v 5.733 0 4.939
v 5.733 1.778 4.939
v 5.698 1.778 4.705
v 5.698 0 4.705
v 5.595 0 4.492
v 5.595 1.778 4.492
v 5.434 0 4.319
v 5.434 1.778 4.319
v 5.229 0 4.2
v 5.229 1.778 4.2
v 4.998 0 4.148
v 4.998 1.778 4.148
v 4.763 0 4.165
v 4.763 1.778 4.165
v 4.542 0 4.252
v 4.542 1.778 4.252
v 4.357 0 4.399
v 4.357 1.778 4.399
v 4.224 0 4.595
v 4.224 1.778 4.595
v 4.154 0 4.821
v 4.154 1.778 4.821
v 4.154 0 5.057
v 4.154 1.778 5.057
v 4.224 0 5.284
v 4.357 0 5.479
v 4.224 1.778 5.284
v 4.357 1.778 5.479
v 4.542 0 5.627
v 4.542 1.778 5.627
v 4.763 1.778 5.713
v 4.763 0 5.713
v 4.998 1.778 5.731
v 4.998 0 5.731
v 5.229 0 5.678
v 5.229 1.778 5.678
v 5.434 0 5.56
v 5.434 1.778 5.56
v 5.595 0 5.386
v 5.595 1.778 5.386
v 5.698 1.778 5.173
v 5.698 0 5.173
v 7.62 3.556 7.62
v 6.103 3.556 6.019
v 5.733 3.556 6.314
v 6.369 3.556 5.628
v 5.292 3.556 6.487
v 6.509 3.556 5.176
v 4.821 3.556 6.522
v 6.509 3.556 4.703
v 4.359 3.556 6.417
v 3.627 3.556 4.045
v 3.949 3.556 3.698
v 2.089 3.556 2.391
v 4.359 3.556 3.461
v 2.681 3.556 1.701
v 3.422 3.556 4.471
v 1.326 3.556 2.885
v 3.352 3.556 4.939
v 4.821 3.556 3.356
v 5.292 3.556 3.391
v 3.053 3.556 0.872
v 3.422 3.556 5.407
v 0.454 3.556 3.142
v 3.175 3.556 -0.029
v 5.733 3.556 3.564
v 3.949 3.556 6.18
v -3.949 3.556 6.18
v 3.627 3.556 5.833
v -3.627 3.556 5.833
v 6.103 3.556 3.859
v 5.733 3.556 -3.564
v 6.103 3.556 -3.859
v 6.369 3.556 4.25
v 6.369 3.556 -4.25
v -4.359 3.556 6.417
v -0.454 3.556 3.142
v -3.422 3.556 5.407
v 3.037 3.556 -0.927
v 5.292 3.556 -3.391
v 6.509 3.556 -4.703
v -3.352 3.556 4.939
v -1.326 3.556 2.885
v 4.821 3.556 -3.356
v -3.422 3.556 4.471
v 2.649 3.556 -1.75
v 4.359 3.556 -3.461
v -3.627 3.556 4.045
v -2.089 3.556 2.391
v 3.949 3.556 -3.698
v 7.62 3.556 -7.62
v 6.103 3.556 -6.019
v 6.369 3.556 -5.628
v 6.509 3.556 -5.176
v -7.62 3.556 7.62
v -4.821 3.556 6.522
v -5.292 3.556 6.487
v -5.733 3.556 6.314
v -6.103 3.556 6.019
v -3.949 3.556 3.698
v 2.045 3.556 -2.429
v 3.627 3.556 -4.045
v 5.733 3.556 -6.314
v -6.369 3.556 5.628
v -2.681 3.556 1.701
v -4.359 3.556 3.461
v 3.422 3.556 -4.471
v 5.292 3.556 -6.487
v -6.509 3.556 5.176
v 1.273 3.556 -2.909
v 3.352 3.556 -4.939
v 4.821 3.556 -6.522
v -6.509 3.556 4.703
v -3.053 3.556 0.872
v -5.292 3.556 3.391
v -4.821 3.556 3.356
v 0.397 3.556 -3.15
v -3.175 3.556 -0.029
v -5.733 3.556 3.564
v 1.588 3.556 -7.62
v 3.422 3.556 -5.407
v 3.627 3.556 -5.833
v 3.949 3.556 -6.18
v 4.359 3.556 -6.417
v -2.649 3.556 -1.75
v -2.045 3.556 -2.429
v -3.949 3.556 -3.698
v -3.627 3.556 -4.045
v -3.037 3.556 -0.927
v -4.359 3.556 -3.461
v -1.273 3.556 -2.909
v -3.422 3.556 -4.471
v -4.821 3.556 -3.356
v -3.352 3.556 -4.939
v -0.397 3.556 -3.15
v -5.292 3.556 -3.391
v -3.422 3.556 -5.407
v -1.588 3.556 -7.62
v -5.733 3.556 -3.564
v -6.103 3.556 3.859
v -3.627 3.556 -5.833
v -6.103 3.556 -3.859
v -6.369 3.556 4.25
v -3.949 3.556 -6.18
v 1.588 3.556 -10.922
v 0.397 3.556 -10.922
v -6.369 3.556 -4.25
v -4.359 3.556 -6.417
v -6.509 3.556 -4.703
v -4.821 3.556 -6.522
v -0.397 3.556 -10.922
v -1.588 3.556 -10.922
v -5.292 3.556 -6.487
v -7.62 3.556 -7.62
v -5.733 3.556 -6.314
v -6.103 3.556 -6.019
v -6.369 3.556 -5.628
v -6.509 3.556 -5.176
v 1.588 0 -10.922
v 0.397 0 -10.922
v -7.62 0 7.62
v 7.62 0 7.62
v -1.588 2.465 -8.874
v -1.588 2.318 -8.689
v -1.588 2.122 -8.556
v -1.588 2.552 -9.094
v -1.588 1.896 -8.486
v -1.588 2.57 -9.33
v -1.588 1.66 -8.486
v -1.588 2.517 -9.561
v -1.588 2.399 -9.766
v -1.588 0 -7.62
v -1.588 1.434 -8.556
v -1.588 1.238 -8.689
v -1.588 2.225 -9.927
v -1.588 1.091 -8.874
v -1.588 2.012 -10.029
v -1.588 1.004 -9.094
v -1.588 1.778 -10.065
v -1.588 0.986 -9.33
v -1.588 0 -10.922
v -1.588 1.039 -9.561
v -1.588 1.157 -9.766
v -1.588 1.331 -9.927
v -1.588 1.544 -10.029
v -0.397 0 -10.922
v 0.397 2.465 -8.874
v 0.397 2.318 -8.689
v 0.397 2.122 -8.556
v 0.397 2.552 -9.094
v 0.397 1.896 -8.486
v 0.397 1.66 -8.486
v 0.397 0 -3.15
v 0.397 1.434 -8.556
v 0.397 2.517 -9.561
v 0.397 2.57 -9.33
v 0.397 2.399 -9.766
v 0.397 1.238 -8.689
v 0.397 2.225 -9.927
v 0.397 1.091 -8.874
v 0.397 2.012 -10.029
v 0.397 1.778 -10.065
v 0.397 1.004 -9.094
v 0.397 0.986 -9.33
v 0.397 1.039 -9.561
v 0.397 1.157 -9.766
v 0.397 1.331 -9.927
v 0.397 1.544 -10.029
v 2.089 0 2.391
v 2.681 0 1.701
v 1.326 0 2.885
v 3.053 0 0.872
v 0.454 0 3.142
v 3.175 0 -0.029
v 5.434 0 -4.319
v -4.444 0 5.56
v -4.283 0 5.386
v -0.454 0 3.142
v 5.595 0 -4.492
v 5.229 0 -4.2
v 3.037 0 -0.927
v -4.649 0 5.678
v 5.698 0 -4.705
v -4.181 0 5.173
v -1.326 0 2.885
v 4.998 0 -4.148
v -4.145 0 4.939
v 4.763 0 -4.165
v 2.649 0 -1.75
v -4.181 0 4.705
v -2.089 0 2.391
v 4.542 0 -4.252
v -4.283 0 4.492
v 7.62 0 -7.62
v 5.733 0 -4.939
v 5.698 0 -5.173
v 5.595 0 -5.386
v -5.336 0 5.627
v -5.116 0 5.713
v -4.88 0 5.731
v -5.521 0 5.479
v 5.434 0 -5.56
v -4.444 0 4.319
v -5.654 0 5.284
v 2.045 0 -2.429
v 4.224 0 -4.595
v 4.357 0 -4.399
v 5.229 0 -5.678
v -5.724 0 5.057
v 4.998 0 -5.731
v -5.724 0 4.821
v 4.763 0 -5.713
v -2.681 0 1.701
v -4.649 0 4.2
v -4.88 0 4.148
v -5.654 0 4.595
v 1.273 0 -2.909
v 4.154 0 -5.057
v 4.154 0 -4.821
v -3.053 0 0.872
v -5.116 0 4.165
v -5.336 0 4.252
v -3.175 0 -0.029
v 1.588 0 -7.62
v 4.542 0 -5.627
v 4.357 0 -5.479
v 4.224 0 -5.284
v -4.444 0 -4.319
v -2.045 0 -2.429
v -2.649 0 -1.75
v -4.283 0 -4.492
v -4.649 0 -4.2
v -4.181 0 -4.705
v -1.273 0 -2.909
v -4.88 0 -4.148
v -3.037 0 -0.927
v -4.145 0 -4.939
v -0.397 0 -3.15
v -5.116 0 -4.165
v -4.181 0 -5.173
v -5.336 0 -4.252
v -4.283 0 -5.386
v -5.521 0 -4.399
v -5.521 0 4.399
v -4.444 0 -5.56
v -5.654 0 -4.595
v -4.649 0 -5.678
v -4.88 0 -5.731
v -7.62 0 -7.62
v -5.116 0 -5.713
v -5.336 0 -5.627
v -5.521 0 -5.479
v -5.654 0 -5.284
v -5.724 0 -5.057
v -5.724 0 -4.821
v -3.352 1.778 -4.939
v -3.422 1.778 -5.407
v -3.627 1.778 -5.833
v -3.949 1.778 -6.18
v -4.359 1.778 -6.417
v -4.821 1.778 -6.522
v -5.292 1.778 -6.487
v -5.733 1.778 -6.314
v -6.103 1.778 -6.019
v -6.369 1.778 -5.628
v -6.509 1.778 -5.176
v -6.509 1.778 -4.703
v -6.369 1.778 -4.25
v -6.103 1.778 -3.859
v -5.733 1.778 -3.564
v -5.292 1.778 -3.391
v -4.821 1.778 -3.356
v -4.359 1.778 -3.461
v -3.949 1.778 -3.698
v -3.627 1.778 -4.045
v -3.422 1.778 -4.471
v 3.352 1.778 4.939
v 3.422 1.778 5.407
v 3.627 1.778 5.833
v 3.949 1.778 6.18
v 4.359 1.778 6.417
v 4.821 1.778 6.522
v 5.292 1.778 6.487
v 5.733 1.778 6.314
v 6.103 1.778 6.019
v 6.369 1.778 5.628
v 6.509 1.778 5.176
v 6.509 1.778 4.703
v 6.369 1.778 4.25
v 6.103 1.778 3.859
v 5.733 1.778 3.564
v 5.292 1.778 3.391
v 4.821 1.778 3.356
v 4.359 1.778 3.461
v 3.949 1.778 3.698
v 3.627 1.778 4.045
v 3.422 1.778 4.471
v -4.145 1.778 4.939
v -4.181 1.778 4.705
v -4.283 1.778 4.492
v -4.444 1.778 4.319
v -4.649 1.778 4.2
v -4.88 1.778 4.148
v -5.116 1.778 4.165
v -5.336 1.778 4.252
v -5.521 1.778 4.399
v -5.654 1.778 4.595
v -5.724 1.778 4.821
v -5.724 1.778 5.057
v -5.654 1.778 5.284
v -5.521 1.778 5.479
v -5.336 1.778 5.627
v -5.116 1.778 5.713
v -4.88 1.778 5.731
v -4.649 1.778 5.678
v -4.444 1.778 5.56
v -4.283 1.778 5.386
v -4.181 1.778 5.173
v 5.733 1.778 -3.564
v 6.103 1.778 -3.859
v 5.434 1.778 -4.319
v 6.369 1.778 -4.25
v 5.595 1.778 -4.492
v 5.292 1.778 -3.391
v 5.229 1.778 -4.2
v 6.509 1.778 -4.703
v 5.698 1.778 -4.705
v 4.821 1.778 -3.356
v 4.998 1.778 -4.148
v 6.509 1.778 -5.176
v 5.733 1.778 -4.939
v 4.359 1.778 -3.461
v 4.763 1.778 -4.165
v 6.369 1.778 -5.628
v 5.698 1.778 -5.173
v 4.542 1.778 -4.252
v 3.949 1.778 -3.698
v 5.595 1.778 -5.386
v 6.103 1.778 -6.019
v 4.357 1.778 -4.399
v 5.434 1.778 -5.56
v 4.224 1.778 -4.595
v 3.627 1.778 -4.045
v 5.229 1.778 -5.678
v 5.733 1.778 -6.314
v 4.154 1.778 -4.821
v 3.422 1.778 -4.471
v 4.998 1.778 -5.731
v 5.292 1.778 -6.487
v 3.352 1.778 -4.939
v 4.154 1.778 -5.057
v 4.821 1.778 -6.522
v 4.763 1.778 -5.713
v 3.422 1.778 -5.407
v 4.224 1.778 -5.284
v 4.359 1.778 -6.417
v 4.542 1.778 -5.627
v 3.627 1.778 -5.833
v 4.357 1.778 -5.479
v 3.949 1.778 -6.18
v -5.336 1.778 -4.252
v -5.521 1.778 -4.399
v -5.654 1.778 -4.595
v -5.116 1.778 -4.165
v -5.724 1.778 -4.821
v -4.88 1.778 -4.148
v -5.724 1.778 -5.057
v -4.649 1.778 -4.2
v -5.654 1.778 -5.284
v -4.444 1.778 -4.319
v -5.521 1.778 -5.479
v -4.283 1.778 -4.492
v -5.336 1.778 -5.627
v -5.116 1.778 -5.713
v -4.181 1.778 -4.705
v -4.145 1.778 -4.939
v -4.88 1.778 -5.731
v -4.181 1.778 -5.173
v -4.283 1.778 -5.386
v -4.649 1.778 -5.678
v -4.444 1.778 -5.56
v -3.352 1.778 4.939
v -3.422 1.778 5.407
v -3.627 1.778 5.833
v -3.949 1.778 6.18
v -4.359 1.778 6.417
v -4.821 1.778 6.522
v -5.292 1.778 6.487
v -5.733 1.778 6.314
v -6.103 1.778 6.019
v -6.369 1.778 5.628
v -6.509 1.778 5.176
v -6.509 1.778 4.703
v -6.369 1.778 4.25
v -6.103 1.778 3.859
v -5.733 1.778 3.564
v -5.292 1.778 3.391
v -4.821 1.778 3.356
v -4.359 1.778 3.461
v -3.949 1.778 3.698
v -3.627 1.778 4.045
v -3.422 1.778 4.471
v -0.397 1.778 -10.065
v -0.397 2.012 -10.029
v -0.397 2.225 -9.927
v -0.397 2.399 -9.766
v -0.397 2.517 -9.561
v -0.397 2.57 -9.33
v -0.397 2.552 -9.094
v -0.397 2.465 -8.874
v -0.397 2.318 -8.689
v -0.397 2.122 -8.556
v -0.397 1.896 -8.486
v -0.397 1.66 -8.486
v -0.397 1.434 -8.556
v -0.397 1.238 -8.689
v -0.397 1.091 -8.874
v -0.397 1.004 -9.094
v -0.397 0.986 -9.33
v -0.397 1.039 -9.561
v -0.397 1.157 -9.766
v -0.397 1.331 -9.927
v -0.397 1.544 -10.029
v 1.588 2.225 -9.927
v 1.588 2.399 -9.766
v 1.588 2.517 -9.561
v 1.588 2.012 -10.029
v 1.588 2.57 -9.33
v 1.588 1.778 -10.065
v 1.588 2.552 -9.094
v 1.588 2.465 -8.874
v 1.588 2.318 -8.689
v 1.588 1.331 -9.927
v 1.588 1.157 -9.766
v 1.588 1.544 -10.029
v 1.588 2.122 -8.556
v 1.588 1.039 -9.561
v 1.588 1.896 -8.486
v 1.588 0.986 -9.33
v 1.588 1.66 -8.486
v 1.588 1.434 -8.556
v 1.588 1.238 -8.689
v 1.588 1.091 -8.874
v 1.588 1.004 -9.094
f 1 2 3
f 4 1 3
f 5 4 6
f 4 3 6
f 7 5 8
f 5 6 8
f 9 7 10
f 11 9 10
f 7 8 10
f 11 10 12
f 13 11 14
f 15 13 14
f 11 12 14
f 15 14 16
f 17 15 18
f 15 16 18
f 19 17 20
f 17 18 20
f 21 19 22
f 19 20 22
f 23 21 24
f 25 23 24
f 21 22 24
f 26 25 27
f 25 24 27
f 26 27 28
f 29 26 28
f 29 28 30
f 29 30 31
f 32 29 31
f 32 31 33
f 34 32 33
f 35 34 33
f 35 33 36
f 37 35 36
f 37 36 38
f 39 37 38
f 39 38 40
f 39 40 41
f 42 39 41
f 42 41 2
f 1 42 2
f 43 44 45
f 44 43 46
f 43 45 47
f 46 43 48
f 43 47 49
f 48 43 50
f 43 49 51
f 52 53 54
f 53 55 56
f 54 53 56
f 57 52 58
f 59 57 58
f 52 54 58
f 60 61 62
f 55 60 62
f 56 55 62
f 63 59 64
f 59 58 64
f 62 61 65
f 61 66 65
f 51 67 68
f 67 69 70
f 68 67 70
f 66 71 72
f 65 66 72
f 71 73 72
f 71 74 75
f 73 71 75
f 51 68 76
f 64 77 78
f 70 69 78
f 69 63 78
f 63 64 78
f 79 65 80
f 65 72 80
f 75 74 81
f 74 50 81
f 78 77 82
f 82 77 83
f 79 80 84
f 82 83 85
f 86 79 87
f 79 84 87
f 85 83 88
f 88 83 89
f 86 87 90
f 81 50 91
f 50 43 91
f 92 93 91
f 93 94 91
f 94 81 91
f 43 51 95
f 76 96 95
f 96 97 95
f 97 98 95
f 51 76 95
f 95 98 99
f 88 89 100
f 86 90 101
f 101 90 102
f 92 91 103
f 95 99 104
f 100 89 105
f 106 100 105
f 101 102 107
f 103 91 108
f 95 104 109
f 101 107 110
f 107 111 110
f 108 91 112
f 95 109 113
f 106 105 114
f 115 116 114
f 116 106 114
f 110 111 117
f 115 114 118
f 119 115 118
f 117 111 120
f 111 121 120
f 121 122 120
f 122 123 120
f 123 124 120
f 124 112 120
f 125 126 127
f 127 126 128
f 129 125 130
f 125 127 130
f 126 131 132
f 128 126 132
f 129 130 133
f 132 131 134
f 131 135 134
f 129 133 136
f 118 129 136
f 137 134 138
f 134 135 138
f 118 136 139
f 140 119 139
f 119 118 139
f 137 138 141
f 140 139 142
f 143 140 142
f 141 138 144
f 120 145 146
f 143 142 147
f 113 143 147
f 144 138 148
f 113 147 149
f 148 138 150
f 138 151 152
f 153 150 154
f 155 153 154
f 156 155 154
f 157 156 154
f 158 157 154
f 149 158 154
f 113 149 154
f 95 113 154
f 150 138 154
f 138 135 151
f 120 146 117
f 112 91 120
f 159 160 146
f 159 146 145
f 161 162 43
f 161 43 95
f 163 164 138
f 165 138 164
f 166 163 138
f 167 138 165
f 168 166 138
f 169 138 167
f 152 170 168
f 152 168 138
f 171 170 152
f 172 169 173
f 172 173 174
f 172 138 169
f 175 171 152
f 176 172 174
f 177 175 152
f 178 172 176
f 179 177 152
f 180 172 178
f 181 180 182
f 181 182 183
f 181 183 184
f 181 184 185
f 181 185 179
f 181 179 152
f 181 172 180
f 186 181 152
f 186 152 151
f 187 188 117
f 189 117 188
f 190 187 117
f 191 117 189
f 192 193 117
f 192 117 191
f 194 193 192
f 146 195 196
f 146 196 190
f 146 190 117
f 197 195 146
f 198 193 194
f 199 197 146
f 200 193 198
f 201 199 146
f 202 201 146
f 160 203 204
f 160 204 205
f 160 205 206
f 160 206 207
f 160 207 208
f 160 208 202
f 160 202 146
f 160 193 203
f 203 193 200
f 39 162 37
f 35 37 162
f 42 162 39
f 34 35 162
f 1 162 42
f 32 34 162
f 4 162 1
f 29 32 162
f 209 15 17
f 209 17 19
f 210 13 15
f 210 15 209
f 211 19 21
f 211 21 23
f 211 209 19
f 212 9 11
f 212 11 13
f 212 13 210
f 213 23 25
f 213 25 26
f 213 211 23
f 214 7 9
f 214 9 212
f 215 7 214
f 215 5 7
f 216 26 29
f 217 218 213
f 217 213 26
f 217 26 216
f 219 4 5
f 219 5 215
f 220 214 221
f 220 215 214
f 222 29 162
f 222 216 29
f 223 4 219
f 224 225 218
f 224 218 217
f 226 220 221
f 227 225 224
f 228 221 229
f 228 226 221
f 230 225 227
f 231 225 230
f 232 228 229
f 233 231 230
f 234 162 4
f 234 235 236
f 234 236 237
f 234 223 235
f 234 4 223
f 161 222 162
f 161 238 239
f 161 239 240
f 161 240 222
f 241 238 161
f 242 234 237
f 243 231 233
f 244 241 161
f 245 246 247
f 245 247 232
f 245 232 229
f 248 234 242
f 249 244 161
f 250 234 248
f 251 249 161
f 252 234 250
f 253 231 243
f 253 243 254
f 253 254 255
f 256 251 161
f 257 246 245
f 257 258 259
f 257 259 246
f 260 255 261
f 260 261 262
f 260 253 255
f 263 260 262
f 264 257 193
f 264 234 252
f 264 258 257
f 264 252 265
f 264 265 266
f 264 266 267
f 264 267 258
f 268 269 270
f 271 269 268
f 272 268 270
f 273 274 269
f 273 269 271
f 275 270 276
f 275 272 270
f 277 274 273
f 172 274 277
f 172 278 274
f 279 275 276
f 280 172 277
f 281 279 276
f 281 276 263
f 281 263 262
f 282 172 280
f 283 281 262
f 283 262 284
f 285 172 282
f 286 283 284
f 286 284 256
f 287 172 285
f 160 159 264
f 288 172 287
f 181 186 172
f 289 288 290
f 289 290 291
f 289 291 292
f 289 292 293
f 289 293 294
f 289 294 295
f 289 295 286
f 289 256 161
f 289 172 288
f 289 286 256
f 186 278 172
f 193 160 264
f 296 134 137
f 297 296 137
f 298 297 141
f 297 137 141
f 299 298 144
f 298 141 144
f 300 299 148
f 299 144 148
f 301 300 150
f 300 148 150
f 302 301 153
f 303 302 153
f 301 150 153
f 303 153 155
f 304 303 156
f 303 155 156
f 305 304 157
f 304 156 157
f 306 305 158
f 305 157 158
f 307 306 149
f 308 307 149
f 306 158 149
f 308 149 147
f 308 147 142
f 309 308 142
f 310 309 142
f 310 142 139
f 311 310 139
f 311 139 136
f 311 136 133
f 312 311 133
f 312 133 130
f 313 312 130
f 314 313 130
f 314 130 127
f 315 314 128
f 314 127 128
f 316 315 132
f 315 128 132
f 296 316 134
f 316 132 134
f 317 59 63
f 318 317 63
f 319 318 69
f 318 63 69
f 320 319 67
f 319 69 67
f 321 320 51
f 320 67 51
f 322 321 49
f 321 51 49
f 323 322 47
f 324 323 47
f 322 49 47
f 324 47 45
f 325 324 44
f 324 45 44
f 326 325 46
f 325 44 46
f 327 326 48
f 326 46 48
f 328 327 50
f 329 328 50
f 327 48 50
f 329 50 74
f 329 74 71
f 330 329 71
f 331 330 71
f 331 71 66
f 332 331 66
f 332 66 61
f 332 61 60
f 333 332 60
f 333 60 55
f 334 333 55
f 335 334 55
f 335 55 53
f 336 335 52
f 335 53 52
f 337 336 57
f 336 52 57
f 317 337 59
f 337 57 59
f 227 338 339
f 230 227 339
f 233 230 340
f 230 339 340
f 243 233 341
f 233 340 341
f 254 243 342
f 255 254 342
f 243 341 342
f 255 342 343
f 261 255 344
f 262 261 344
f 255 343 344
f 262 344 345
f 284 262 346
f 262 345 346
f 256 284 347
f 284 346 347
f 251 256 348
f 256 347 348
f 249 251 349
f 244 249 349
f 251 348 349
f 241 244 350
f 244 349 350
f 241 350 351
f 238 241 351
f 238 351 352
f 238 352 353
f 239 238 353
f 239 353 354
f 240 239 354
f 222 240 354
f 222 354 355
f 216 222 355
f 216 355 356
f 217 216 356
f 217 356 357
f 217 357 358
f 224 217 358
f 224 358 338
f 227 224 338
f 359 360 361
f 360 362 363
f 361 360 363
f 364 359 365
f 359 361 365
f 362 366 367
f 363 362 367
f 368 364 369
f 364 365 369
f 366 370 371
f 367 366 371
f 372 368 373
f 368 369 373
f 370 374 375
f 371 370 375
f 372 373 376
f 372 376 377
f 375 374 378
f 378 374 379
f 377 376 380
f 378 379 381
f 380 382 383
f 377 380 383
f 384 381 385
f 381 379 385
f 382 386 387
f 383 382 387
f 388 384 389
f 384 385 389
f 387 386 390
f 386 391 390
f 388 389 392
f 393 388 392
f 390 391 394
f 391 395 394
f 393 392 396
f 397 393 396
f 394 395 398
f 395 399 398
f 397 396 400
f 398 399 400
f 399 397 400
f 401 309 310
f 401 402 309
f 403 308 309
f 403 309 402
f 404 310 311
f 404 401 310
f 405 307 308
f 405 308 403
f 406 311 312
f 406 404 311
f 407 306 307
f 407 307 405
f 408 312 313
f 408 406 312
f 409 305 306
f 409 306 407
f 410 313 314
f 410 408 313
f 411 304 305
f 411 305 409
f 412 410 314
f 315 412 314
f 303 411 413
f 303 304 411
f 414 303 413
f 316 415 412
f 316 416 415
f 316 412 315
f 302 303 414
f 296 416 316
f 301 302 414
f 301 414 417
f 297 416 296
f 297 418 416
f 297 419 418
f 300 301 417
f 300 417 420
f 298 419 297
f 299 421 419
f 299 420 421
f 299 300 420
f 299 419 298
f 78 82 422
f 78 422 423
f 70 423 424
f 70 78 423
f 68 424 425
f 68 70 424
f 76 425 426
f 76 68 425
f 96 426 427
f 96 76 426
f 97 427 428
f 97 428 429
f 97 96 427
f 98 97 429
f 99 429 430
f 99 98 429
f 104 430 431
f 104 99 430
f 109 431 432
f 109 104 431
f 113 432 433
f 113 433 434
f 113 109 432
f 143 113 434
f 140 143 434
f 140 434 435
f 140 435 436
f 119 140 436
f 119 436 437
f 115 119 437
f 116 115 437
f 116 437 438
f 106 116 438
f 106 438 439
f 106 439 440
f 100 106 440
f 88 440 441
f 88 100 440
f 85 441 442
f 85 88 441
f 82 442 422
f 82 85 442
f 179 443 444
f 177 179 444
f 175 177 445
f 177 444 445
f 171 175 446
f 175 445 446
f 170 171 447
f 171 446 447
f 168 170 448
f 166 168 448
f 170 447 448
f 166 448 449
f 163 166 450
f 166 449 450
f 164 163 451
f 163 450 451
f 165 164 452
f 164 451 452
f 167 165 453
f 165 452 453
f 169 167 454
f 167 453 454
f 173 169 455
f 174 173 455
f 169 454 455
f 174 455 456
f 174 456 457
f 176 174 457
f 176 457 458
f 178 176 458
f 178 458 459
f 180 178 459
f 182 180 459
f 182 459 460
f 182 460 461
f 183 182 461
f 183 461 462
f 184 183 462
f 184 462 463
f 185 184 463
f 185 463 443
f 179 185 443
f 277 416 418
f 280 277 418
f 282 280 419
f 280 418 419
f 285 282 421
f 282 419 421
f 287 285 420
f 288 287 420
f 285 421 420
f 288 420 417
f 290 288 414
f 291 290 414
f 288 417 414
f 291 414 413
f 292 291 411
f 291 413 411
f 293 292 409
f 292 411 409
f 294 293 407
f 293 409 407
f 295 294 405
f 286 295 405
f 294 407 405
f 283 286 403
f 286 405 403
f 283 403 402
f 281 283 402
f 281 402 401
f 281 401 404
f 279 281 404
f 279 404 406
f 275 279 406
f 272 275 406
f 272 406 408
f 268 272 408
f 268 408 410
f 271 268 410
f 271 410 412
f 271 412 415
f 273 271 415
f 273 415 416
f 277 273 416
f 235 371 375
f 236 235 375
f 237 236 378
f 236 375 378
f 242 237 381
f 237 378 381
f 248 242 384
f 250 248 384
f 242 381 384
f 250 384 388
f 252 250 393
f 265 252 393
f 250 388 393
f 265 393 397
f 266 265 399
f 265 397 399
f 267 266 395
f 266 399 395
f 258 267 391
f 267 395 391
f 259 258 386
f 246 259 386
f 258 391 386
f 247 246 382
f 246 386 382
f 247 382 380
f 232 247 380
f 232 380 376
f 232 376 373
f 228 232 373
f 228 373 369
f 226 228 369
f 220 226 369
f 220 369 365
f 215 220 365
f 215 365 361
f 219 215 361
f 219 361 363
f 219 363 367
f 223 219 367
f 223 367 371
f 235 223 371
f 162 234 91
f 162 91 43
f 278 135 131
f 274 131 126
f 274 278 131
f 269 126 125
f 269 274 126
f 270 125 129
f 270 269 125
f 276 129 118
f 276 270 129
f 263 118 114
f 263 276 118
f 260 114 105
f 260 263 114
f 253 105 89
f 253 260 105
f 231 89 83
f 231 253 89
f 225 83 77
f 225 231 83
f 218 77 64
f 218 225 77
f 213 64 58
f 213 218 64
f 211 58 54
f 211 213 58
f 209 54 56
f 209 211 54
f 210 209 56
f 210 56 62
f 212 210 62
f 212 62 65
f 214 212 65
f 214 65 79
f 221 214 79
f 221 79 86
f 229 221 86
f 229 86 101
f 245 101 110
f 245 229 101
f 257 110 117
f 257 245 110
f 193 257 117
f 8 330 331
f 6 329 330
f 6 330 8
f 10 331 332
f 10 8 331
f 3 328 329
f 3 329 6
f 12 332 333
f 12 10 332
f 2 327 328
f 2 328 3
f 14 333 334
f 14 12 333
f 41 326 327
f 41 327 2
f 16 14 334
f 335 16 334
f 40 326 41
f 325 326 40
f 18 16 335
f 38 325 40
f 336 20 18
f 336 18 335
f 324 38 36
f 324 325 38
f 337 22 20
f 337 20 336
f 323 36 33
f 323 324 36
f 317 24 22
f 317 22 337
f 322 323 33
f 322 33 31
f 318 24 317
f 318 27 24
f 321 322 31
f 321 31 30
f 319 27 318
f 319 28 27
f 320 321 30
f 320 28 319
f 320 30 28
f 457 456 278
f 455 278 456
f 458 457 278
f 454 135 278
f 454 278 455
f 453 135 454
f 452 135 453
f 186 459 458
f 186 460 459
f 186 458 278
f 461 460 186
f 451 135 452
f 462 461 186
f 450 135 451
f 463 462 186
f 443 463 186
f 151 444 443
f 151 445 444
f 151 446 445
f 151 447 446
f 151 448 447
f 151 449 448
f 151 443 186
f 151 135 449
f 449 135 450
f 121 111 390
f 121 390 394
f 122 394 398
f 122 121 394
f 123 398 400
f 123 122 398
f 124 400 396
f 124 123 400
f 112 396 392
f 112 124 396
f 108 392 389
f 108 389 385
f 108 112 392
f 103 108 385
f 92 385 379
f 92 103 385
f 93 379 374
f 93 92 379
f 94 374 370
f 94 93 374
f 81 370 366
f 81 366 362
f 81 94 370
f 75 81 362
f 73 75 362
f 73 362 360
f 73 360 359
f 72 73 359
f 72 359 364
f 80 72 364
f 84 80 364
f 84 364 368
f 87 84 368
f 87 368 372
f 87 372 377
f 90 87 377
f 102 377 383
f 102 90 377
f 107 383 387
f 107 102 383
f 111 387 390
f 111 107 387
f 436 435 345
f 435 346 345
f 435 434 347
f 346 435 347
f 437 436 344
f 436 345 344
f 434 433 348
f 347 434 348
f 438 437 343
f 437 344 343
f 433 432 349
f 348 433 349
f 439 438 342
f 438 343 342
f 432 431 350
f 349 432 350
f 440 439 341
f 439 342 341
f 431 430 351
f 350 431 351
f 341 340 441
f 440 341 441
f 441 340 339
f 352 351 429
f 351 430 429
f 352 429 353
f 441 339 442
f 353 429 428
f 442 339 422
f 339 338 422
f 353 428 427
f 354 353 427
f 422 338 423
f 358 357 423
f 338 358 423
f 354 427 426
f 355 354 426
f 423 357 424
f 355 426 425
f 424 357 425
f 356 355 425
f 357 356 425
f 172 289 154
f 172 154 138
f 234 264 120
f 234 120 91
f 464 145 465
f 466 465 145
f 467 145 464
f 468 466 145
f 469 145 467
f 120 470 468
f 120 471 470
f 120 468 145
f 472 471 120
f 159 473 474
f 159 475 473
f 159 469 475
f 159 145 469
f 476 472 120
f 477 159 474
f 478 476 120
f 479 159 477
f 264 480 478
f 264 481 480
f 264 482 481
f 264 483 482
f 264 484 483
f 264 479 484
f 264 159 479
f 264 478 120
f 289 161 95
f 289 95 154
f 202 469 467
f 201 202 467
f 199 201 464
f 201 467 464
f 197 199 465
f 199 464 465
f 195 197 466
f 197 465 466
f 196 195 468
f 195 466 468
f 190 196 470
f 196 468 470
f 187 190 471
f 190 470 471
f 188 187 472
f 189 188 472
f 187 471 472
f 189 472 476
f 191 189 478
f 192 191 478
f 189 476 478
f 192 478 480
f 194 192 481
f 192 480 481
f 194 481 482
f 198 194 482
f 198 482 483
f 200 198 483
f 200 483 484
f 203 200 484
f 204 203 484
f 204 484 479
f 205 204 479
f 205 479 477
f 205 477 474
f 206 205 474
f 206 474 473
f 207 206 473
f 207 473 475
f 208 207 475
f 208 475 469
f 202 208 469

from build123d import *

# Parameters (mm, degrees)
SKETCH1_R                                  = 3.175
BOSS_EXTRUDE1_DEPTH                        = 3.556
SKETCH2_R                                  = 0.79375
CUT_EXTRUDE1_DEPTH                         = 4.556
SKETCH3_R                                  = 0.79375
CUT_EXTRUDE2_DEPTH                         = 3.175
SKETCH4_W                                  = 0.79375
SKETCH4_H                                  = 4.469902345
CUT_EXTRUDE3_DEPTH                         = 4.556
SKETCH5_R                                  = 1.5875
CUT_EXTRUDE4_DEPTH                         = 1.778
MIRROR1_AT_THE_SECOND_PLANE_COPY_1_SKETC_R = 1.5875
MIRROR1_AT_THE_SECOND_PLANE_COPY_1_DEPTH   = 1.778


with BuildPart() as part:
    # Sketch1 → Boss-Extrude1 (new body)
    with BuildSketch(Plane(origin=(0, 0, 0), x_dir=(1, 0, 0), z_dir=(0, 1, 0))):
        Polygon((-1.5875, 7.62), (-1.5875, 10.922), (-0.396875, 10.922), (-0.396875, 7.62), (0.396875, 7.62), (0.396875, 10.922), (1.5875, 10.922), (1.5875, 7.62), (7.62, 7.62), (7.62, -7.62), (-7.62, -7.62), (-7.62, 7.62), align=None)
        Circle(SKETCH1_R, mode=Mode.SUBTRACT)
    extrude(amount=BOSS_EXTRUDE1_DEPTH)

    # Sketch2 → Cut-Extrude1 (cut, through all)
    with BuildSketch(Plane(origin=(0, 3.556, 0), x_dir=(1, 0, 0), z_dir=(0, 1, 0))):
        with Locations((-4.939140867, 4.939140867)):
            Circle(SKETCH2_R)
        with Locations((4.939140867, 4.939140867)):
            Circle(SKETCH2_R)
        with Locations((4.939140867, -4.939140867)):
            Circle(SKETCH2_R)
        with Locations((-4.939140867, -4.939140867)):
            Circle(SKETCH2_R)
    extrude(amount=-CUT_EXTRUDE1_DEPTH, mode=Mode.SUBTRACT)

    # Sketch3 → Cut-Extrude2 (cut)
    with BuildSketch(Plane(origin=(1.5875, 0, 0), x_dir=(0, 0, -1), z_dir=(1, 0, 0))):
        with Locations((9.271, 1.778)):
            Circle(SKETCH3_R)
    extrude(amount=-CUT_EXTRUDE2_DEPTH, mode=Mode.SUBTRACT)

    # Sketch4 → Cut-Extrude3 (cut, through all)
    with BuildSketch(Plane(origin=(0, 3.556, 0), x_dir=(1, 0, 0), z_dir=(0, 1, 0))):
        with Locations((0, 5.385048828)):
            Rectangle(SKETCH4_W, SKETCH4_H)
    extrude(amount=-CUT_EXTRUDE3_DEPTH, mode=Mode.SUBTRACT)

    # Sketch5 → Cut-Extrude4 (cut)
    with BuildSketch(Plane(origin=(0, 3.556, 0), x_dir=(1, 0, 0), z_dir=(0, 1, 0))):
        with Locations((-4.939140867, 4.939140867)):
            Circle(SKETCH5_R)
    cut_extrude4 = extrude(amount=-CUT_EXTRUDE4_DEPTH, mode=Mode.SUBTRACT)

    # Mirror1: Cut-Extrude4 across plane
    add(cut_extrude4.mirror(Plane.XY), mode=Mode.SUBTRACT)

    # Mirror1 at the second plane: Cut-Extrude4 across plane
    add(cut_extrude4.mirror(Plane(origin=(0, 0, 0), x_dir=(0, 0, 1), z_dir=(1, 0, 0))), mode=Mode.SUBTRACT)

    # Mirror1 at the second plane copy 1 sketc → Mirror1 at the second plane copy 1 (cut)
    with BuildSketch(Plane(origin=(0, 3.556, 0), x_dir=(-1, 0, 0), z_dir=(0, 1, 0))):
        with Locations((-4.939140867, 4.939140867)):
            Circle(MIRROR1_AT_THE_SECOND_PLANE_COPY_1_SKETC_R)
    extrude(amount=-MIRROR1_AT_THE_SECOND_PLANE_COPY_1_DEPTH, mode=Mode.SUBTRACT)


solid = part.part
